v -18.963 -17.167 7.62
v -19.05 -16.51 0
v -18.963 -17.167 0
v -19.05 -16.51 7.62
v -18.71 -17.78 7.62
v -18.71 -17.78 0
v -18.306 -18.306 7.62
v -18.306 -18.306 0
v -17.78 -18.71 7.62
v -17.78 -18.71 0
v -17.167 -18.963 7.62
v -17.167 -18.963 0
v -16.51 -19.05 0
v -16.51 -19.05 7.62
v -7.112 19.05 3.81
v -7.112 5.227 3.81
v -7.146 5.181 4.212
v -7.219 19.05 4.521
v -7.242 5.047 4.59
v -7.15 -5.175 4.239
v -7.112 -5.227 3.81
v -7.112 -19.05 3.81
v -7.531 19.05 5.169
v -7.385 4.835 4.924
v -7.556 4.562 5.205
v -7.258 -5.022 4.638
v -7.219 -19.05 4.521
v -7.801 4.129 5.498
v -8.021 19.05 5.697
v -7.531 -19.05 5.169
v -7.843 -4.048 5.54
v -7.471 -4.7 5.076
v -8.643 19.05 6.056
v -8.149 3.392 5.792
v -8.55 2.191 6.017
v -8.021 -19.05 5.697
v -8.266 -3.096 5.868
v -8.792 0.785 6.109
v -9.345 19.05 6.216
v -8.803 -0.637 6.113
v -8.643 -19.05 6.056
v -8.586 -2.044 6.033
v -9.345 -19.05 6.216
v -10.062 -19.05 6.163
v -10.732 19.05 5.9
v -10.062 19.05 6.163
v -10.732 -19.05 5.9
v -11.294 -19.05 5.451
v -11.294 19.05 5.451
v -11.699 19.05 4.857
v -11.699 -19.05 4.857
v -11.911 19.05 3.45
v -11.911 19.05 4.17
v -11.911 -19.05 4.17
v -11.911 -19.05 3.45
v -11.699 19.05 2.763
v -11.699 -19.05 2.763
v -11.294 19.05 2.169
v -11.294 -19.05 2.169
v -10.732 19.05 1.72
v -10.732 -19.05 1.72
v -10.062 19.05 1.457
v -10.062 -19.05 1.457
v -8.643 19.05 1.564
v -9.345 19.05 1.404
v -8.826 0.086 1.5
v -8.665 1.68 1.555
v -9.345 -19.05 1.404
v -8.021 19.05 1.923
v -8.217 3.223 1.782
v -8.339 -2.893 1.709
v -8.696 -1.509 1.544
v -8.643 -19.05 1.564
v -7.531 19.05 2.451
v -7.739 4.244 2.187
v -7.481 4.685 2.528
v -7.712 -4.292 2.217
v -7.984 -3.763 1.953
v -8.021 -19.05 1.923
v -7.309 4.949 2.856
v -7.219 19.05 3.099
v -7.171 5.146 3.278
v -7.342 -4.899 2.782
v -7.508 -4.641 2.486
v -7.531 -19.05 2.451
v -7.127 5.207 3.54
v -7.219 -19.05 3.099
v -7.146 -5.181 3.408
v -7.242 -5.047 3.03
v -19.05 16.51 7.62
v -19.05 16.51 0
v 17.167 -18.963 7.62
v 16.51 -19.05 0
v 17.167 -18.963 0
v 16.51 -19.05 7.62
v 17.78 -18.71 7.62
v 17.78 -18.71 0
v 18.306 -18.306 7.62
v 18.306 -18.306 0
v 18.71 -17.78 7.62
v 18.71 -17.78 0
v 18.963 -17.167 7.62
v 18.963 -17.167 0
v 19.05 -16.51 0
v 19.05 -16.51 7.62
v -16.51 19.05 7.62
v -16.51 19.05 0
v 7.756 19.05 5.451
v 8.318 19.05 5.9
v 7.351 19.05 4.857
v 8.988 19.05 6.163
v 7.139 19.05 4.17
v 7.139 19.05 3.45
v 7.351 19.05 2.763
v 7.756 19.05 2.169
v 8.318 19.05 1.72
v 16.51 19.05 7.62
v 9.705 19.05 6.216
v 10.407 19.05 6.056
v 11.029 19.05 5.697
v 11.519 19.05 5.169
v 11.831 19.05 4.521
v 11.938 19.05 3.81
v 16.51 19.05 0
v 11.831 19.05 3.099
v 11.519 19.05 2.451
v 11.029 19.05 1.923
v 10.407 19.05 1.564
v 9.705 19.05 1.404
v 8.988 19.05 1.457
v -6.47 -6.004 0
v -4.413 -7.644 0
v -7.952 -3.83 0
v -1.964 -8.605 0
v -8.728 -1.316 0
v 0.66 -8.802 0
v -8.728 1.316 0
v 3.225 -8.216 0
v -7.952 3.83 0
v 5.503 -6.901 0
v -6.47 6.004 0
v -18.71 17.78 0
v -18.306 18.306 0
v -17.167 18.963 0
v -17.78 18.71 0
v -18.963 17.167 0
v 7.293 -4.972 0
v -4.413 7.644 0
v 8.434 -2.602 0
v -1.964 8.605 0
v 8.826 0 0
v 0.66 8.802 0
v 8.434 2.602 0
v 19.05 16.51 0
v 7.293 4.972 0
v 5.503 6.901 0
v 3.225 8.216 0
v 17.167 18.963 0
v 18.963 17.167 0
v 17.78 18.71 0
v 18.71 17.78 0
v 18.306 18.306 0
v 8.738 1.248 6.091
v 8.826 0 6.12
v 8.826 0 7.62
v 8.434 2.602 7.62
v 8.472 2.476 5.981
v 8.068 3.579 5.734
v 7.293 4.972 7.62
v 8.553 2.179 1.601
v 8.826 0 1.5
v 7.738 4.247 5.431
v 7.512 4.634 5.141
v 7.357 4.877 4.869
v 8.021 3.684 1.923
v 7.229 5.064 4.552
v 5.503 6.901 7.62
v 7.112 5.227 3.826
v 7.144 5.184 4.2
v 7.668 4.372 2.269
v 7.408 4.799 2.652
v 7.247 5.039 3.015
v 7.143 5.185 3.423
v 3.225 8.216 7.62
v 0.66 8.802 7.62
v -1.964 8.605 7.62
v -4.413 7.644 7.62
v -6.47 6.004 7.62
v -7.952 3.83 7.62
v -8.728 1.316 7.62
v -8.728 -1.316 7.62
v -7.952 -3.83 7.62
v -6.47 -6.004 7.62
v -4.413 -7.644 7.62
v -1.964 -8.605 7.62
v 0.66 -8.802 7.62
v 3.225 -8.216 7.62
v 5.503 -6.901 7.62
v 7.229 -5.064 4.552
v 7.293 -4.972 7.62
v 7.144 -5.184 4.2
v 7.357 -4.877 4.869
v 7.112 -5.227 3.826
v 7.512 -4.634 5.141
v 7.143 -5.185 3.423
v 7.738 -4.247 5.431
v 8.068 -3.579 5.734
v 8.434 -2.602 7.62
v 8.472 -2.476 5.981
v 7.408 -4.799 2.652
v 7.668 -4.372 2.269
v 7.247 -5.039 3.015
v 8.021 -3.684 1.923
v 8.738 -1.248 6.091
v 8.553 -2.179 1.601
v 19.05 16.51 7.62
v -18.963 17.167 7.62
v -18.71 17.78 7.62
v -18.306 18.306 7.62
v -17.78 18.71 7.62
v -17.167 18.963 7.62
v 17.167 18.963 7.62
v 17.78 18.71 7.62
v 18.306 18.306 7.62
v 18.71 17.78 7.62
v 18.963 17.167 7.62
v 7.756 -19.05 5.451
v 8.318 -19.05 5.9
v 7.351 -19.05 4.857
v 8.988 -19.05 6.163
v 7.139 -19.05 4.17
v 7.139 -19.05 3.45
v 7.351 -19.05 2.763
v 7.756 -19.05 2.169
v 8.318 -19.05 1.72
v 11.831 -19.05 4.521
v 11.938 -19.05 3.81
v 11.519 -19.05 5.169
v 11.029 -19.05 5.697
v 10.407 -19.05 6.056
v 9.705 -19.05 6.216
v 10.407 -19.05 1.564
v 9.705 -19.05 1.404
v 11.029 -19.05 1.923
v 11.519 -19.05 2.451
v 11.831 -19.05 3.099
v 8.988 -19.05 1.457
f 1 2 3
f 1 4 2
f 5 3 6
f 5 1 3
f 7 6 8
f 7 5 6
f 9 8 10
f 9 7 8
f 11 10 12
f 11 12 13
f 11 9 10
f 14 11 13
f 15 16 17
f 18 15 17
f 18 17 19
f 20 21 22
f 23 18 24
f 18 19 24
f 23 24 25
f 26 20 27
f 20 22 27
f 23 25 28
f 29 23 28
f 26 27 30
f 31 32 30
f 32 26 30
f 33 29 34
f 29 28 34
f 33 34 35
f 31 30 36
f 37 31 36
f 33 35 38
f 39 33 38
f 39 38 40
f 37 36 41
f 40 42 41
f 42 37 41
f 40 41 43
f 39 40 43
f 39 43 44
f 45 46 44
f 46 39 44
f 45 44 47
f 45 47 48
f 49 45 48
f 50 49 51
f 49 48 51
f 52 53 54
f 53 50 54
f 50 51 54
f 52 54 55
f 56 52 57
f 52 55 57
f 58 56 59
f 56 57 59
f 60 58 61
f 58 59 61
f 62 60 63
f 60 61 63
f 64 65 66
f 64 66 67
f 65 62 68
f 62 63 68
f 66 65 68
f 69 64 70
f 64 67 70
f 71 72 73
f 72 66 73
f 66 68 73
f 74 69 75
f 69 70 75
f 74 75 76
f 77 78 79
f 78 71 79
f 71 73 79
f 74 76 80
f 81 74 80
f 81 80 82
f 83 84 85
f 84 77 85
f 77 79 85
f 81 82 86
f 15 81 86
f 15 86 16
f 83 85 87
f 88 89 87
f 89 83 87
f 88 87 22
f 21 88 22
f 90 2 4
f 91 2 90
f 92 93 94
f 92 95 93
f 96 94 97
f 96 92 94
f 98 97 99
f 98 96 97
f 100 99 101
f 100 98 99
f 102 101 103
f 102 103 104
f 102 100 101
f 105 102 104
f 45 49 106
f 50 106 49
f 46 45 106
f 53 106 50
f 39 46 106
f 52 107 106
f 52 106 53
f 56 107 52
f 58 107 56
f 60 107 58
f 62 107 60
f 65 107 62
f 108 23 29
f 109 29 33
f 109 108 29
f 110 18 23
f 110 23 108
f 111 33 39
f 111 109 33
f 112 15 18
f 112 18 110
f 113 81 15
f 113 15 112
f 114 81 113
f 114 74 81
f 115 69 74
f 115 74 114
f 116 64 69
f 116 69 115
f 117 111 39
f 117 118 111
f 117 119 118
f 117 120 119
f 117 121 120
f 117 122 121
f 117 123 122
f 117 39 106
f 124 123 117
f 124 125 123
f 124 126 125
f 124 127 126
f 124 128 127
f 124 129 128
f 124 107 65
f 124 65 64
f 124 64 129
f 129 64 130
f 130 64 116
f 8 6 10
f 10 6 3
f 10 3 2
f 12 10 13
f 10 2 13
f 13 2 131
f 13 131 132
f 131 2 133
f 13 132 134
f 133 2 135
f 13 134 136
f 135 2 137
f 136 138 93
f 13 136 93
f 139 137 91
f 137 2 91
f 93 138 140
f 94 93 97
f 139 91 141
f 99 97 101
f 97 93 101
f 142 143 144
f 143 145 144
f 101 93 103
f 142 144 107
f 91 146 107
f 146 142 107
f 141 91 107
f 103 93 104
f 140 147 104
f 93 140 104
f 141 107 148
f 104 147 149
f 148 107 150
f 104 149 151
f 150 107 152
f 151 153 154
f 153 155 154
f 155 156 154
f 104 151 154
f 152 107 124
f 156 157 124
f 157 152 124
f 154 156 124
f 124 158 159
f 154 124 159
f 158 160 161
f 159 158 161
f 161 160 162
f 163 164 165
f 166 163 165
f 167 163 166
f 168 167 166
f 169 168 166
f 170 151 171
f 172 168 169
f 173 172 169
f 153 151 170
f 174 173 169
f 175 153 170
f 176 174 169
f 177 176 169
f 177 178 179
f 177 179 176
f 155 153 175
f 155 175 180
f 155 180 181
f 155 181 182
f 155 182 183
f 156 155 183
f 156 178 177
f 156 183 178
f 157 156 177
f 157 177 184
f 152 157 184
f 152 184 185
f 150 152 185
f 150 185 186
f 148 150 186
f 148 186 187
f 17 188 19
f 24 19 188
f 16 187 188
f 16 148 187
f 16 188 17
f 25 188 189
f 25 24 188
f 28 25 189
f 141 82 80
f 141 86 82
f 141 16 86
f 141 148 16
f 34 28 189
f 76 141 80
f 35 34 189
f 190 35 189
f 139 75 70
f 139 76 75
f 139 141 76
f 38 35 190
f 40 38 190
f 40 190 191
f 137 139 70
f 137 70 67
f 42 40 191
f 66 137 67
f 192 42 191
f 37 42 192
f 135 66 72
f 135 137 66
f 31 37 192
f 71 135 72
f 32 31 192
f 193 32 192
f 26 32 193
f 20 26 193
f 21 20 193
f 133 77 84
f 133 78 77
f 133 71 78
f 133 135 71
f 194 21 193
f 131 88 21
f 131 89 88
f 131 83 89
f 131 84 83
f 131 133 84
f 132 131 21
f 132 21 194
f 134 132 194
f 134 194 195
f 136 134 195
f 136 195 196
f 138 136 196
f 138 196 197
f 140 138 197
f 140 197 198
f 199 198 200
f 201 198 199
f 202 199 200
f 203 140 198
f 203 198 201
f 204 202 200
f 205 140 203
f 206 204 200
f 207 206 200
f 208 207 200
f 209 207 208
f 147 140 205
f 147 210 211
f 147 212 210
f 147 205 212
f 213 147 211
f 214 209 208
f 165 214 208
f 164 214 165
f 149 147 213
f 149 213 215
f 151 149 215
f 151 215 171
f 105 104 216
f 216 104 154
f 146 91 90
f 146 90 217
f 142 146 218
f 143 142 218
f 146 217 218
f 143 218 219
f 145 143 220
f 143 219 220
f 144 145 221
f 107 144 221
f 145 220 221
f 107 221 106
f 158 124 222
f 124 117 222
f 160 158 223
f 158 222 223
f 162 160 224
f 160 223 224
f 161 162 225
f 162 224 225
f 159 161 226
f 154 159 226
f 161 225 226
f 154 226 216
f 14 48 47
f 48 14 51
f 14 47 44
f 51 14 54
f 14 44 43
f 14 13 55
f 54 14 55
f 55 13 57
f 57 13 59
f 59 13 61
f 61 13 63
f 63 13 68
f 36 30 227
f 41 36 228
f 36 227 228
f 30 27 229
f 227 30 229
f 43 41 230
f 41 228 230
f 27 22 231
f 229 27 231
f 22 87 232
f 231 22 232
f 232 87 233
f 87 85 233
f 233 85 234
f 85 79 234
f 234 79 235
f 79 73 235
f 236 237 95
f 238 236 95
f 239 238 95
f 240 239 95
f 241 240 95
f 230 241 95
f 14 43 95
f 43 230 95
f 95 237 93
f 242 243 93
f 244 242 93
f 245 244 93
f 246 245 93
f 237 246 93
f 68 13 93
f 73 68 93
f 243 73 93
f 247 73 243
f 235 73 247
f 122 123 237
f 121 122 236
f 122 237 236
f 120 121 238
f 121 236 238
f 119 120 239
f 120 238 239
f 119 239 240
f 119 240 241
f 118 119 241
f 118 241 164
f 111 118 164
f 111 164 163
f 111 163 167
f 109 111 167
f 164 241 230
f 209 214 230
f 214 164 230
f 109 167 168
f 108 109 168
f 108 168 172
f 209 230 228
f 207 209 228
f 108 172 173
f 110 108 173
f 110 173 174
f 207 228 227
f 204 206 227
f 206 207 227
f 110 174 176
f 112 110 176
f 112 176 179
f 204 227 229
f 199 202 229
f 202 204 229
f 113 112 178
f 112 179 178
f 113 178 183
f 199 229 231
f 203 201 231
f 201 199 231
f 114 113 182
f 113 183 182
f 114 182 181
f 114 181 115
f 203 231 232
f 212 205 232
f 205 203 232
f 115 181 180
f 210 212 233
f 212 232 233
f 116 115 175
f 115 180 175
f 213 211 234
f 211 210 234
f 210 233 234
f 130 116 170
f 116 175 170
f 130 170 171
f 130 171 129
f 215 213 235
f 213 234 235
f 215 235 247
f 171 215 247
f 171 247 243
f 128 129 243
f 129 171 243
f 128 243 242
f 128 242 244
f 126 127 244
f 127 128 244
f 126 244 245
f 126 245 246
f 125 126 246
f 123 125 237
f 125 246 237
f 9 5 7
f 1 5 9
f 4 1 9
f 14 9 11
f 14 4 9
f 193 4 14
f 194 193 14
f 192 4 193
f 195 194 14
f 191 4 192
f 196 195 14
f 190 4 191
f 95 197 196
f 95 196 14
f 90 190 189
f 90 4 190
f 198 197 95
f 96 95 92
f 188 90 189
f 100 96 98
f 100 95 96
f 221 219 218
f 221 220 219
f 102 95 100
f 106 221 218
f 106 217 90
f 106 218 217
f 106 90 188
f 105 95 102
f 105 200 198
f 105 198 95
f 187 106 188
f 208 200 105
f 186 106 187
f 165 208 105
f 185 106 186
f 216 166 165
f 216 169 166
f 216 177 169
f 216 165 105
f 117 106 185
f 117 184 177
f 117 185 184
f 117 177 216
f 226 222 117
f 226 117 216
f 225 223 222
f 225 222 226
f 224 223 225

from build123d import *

# Parameters (mm, degrees)
SKETCH1_W           = 38.1
SKETCH1_H           = 38.1
SKETCH1_R           = 8.8265
BOSS_EXTRUDE1_DEPTH = 7.62
FILLET1_R           = 2.54
SKETCH2_R           = 2.413
CUT_EXTRUDE1_DEPTH  = 7.62
SKETCH3_R           = 2.413
CUT_EXTRUDE2_DEPTH  = 7.62
SKETCH4_R           = 2.413
CUT_EXTRUDE3_DEPTH  = 39.1


with BuildPart() as part:
    # Sketch1 → Boss-Extrude1 (new body)
    with BuildSketch(Plane.XY):
        Rectangle(SKETCH1_W, SKETCH1_H)
        Circle(SKETCH1_R, mode=Mode.SUBTRACT)
    extrude(amount=BOSS_EXTRUDE1_DEPTH)

    # Fillet1
    fillet1_edges = [part.edges().sort_by_distance(p)[0] for p in [
        (-19.05, 19.05, 3.81),
        (19.05, 19.05, 3.81),
        (19.05, -19.05, 3.81),
        (-19.05, -19.05, 3.81),
    ]]
    fillet(fillet1_edges, radius=FILLET1_R)

    # Sketch2 → Cut-Extrude1 (cut)
    with BuildSketch(Plane.XZ.offset(19.05)):
        with Locations((9.525, 3.81)):
            Circle(SKETCH2_R)
        with Locations((-9.525, 3.81)):
            Circle(SKETCH2_R)
    extrude(amount=-CUT_EXTRUDE1_DEPTH, mode=Mode.SUBTRACT)

    # Sketch3 → Cut-Extrude2 (cut)
    with BuildSketch(Plane(origin=(0, 19.05, 0), x_dir=(1, 0, 0), z_dir=(0, 1, 0))):
        with Locations((-9.525, -3.81)):
            Circle(SKETCH3_R)
        with Locations((9.525, -3.81)):
            Circle(SKETCH3_R)
    extrude(amount=-CUT_EXTRUDE2_DEPTH, mode=Mode.SUBTRACT)

    # Sketch4 → Cut-Extrude3 (cut, through all)
    with BuildSketch(Plane(origin=(0, 19.05, 0), x_dir=(1, 0, 0), z_dir=(0, 1, 0))):
        with Locations((9.525, -3.81)):
            Circle(SKETCH4_R)
        with Locations((-9.525, -3.81)):
            Circle(SKETCH4_R)
    extrude(amount=-CUT_EXTRUDE3_DEPTH, mode=Mode.SUBTRACT)


solid = part.part
